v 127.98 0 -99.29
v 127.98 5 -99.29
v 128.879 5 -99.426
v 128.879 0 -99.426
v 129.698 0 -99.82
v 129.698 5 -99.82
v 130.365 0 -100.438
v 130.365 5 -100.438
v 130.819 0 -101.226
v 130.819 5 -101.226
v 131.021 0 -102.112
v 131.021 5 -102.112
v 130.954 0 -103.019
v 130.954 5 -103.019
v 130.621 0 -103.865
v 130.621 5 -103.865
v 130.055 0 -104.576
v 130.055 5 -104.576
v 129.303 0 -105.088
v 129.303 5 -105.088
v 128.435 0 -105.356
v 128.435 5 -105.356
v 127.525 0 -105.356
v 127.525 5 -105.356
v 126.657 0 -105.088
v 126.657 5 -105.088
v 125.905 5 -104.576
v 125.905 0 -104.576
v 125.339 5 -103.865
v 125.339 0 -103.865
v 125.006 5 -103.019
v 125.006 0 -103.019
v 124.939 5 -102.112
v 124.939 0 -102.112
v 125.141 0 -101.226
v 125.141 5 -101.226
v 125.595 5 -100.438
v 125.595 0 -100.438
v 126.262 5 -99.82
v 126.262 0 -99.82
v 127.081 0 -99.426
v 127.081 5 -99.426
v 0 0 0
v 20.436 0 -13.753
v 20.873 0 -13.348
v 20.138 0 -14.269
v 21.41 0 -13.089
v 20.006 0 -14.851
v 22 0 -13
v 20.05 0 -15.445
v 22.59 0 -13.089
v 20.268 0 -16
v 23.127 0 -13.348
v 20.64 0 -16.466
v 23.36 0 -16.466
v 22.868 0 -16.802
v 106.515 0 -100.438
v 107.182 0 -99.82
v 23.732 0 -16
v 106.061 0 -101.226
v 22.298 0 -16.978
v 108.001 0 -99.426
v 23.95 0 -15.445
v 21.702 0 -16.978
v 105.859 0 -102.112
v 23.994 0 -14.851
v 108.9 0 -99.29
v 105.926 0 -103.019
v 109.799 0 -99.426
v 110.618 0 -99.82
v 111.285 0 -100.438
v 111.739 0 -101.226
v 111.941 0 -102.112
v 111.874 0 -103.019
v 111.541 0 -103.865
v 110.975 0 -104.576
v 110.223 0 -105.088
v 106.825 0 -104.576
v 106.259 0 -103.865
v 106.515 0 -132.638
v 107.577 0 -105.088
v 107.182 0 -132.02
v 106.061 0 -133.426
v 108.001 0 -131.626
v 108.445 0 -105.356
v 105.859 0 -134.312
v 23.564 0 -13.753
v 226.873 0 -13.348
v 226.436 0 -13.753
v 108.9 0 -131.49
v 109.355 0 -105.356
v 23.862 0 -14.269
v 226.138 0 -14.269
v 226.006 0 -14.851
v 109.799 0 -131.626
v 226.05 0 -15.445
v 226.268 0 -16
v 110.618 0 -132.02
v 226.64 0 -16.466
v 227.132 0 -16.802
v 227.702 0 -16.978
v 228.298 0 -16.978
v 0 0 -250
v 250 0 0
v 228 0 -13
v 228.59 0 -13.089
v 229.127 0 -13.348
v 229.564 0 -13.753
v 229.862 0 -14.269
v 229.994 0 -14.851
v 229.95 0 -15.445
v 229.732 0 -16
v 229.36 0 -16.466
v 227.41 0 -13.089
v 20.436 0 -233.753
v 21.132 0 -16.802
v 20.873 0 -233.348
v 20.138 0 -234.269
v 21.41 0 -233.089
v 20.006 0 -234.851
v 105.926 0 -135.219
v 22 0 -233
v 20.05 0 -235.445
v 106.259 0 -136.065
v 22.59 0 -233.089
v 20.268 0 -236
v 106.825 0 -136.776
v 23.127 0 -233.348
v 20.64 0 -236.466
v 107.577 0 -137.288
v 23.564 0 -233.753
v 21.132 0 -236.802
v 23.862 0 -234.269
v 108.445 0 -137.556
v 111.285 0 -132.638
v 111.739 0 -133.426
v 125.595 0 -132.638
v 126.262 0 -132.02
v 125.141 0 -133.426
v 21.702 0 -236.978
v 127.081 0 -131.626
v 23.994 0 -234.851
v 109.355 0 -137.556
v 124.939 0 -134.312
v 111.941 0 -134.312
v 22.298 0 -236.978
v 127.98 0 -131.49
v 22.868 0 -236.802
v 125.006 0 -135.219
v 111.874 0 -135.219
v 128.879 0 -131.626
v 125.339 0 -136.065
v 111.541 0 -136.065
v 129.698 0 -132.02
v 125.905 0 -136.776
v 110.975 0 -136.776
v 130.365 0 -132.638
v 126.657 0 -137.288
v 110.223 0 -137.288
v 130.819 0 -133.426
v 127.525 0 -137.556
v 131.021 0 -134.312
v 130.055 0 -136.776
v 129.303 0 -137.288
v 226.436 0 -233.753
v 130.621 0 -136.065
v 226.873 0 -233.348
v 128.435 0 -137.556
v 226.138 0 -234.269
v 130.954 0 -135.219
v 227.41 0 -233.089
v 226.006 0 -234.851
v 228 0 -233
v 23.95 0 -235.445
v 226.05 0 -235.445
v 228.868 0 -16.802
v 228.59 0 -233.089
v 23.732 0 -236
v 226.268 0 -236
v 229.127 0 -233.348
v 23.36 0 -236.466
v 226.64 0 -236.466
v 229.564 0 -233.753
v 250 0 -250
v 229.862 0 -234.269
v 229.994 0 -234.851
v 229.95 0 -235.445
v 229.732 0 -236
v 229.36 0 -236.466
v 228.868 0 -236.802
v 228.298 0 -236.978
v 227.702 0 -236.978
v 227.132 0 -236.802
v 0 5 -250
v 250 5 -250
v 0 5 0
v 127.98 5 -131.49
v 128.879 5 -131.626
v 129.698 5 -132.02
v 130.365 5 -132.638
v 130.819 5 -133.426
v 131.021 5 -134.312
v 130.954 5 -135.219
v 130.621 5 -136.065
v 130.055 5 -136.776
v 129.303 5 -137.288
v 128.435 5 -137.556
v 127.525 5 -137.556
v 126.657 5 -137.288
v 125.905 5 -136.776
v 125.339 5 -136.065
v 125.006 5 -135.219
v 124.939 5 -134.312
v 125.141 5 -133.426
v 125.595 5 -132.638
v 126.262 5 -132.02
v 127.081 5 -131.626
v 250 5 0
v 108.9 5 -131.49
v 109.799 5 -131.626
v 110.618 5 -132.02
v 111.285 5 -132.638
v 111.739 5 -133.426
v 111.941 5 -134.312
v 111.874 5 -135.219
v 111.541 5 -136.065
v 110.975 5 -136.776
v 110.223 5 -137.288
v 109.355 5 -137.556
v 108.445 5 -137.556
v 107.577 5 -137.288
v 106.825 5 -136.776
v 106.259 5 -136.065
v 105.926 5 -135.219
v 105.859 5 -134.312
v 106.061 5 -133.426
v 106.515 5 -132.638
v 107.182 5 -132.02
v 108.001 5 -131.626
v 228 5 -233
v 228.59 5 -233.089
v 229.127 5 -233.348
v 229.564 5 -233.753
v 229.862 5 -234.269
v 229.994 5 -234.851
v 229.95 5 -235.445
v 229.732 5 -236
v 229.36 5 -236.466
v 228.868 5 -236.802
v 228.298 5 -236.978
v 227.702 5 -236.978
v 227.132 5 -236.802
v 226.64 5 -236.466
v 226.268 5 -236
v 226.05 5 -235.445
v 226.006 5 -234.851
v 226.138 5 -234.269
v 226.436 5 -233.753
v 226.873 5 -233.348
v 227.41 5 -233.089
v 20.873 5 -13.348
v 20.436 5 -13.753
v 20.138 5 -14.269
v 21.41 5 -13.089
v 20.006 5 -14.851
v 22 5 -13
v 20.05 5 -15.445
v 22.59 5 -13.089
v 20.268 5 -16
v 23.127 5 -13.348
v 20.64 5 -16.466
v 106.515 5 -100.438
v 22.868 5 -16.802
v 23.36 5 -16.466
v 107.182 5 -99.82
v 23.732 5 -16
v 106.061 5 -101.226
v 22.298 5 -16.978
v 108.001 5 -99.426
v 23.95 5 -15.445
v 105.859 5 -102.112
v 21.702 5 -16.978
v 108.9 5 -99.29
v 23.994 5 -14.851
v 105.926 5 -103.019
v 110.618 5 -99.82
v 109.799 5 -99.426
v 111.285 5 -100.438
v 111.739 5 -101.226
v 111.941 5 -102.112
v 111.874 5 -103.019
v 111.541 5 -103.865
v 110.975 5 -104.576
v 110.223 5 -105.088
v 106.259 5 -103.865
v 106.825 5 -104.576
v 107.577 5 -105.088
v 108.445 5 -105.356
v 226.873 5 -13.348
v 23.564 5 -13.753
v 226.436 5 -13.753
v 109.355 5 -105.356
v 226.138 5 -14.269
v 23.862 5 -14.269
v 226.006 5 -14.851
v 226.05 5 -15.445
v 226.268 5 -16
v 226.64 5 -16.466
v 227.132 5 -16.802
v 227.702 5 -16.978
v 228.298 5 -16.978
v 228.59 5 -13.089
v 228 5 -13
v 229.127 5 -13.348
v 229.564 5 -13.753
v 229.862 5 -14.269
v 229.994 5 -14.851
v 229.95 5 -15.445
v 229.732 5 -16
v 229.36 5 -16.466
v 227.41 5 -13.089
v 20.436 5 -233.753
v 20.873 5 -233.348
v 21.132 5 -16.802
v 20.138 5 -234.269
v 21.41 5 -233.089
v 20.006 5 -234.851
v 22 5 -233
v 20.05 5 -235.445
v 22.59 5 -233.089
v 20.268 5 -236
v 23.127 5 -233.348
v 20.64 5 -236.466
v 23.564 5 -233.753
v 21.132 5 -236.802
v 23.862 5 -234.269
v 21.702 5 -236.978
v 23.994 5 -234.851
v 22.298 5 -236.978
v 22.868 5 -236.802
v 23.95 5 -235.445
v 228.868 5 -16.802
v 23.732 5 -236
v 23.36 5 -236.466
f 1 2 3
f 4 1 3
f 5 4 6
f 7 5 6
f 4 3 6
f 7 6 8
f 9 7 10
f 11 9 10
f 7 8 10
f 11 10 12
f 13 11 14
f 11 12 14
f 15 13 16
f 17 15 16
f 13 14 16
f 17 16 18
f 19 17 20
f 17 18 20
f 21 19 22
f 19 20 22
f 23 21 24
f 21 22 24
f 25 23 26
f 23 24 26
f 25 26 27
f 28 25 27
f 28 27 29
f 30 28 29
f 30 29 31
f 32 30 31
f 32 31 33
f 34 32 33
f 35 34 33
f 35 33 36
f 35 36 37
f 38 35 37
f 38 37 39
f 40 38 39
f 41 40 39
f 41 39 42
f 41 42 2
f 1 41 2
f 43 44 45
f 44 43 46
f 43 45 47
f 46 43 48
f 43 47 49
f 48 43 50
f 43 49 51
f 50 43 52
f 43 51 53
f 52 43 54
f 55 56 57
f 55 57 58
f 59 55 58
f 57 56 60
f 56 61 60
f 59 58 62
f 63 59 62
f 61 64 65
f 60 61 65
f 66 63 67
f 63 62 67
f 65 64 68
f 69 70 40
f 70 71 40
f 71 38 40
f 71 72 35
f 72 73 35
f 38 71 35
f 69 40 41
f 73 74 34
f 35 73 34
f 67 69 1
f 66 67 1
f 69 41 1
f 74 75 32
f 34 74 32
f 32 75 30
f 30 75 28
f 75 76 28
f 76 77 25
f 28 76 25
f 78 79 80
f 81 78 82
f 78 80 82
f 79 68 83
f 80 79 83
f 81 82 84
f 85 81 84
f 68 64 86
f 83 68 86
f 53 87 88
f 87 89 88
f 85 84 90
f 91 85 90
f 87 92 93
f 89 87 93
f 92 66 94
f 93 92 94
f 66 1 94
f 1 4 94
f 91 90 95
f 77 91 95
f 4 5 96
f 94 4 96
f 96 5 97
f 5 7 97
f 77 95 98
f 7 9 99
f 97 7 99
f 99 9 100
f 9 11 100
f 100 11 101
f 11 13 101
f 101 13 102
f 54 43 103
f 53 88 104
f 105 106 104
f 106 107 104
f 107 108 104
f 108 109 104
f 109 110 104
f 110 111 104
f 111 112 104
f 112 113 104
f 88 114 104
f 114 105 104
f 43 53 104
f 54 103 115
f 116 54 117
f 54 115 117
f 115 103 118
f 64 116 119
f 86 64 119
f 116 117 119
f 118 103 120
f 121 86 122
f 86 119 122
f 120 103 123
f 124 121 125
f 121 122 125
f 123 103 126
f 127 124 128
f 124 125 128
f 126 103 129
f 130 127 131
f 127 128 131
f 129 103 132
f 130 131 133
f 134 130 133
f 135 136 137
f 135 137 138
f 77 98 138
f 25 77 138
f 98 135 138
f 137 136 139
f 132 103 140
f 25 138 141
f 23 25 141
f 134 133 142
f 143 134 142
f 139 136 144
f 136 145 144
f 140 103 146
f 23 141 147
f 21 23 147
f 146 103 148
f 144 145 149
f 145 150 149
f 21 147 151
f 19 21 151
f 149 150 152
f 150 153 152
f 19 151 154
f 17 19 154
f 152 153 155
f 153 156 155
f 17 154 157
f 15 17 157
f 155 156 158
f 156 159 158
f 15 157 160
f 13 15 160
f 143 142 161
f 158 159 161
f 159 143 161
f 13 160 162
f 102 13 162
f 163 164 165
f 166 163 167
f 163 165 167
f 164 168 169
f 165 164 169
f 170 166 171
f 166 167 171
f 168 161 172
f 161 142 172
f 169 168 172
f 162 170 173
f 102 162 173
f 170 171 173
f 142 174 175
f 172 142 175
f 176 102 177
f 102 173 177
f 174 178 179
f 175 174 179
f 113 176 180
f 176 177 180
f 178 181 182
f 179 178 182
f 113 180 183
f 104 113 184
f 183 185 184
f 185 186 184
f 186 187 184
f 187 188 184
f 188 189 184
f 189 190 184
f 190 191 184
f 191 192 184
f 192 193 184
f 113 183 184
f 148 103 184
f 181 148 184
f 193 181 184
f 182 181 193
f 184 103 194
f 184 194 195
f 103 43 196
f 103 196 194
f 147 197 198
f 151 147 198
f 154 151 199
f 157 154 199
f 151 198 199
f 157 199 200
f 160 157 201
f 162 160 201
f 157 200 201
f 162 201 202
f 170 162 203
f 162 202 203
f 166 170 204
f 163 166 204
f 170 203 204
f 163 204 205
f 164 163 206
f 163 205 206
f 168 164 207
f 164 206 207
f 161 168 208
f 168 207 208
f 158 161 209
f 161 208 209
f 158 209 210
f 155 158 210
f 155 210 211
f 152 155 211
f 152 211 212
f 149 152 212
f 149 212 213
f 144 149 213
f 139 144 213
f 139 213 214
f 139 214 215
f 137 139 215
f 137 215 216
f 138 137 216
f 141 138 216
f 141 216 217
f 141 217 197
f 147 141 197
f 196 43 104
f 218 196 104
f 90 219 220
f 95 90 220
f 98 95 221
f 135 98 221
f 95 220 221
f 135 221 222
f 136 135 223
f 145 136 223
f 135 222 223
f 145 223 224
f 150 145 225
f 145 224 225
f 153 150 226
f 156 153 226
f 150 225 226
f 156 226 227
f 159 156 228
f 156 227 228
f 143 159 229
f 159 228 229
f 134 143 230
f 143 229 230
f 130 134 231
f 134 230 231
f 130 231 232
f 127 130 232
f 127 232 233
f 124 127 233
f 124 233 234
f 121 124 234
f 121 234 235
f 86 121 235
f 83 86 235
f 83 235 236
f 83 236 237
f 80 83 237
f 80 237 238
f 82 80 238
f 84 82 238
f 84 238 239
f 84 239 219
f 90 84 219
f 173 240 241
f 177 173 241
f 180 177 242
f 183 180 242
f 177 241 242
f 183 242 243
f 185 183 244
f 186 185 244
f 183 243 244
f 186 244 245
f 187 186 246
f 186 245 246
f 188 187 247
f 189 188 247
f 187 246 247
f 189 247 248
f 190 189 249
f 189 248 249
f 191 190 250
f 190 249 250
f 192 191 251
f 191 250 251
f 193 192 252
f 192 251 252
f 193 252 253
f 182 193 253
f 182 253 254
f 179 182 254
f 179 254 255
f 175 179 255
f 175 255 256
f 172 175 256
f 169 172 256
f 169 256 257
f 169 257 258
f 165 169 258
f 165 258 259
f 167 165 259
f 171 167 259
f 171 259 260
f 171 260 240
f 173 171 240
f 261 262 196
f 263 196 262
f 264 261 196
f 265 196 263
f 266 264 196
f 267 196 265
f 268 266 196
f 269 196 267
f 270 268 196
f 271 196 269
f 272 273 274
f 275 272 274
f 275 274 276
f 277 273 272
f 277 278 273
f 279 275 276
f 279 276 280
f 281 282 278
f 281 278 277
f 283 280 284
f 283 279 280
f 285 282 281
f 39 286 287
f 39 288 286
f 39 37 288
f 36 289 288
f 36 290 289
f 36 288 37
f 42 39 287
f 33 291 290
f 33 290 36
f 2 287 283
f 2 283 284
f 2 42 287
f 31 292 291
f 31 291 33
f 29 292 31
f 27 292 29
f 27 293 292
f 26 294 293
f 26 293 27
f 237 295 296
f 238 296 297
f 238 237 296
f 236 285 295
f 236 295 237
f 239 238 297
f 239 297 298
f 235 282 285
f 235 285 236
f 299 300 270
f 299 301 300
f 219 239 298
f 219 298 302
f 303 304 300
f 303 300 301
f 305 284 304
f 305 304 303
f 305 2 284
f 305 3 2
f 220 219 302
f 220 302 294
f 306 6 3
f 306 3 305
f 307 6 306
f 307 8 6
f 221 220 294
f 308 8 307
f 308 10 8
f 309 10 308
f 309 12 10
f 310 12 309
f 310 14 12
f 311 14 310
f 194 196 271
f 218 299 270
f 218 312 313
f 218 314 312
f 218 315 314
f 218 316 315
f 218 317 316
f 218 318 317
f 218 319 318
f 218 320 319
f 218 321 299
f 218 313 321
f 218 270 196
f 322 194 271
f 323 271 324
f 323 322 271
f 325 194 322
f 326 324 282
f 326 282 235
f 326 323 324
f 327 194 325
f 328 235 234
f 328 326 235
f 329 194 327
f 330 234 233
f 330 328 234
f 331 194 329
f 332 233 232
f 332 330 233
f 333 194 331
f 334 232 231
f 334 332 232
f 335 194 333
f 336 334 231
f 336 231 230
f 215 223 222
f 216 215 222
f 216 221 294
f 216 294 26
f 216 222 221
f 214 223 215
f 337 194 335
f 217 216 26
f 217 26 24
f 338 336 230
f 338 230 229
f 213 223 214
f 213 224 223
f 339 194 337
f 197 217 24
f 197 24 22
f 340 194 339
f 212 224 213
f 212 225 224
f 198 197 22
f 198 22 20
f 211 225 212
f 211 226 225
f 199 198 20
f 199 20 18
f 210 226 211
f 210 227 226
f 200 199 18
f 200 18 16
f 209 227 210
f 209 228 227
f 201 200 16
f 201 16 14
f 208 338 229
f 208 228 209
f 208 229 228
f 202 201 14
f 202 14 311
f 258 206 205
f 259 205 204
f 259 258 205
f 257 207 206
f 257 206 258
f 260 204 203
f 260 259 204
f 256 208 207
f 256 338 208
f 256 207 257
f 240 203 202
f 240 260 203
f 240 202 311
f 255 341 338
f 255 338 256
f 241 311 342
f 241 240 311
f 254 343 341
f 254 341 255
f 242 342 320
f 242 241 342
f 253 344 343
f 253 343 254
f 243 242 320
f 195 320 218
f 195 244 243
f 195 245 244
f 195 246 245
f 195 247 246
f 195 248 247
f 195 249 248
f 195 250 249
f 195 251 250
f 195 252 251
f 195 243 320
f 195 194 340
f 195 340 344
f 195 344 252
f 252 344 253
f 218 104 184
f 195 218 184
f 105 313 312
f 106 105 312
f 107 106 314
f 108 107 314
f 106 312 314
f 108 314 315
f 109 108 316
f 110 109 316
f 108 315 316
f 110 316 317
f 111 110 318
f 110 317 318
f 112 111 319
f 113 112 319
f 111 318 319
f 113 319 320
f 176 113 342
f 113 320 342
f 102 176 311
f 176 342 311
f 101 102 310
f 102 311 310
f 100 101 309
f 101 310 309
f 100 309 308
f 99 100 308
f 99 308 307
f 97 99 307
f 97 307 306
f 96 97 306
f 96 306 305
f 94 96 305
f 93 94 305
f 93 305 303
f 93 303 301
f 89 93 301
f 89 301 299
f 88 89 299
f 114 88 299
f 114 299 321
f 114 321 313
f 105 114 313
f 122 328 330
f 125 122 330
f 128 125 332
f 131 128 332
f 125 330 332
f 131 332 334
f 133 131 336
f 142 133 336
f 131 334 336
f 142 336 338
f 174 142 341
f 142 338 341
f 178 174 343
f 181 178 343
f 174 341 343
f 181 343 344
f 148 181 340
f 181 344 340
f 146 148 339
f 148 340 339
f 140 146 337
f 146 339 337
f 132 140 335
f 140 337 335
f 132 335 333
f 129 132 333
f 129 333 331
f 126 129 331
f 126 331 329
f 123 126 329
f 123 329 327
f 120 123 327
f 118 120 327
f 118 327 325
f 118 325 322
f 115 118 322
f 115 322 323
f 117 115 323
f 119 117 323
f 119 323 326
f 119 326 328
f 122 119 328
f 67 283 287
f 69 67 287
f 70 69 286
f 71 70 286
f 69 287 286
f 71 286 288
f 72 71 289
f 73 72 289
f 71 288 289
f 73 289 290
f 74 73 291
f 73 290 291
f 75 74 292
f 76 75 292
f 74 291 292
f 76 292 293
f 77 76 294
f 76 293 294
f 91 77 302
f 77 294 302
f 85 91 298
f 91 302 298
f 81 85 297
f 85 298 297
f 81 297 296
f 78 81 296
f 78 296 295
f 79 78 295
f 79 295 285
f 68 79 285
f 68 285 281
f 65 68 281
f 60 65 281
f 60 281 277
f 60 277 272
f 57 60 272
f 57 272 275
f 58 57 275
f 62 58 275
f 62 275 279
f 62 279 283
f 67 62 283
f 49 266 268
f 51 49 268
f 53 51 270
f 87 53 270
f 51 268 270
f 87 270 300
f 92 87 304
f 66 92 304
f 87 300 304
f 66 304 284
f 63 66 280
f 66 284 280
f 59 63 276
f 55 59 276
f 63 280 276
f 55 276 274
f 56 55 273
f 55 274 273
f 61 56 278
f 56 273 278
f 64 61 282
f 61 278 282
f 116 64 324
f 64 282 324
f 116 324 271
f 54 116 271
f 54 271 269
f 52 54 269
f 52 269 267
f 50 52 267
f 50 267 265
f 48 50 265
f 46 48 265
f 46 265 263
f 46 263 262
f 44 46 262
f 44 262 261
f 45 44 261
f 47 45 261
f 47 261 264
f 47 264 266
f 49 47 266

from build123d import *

# Parameters (mm, degrees)
SKETCH2_W            = 250
SKETCH2_H            = 250
BOSS_EXTRUDE1_DEPTH  = 5
SKETCH3_R            = 2
SKETCH3_R_2          = 3.05
CUT_EXTRUDE1_DEPTH   = 354.588744165
LPATTERN1_COUNT      = 2
LPATTERN1_PITCH      = 220
LPATTERN1_COUNT_DIR2 = 2
LPATTERN1_PITCH_DIR2 = 206


with BuildPart() as part:
    # Sketch2 → Boss-Extrude1 (new body)
    with BuildSketch(Plane(origin=(0, 0, 0), x_dir=(1, 0, 0), z_dir=(0, 1, 0))):
        with Locations((125, 125)):
            Rectangle(SKETCH2_W, SKETCH2_H)
    extrude(amount=BOSS_EXTRUDE1_DEPTH)

    # Sketch3 → Cut-Extrude1 (cut, through all)
    with BuildSketch(Plane(origin=(0, 5, 0), x_dir=(1, 0, 0), z_dir=(0, 1, 0))):
        with Locations(Location((22, 15, 0), (0, 0, 270))):
            Circle(SKETCH3_R)
        with Locations(Location((108.9, 134.54, 0), (0, 0, 270))):
            Circle(SKETCH3_R_2)
        with Locations(Location((127.98, 134.54, 0), (0, 0, 270))):
            Circle(SKETCH3_R_2)
        with Locations(Location((127.98, 102.34, 0), (0, 0, 270))):
            Circle(SKETCH3_R_2)
        with Locations(Location((108.9, 102.34, 0), (0, 0, 270))):
            Circle(SKETCH3_R_2)
    cut_extrude1 = extrude(amount=-CUT_EXTRUDE1_DEPTH, mode=Mode.SUBTRACT)

    # LPattern1: Cut-Extrude1 2 × 2
    with Locations(*[(j * LPATTERN1_PITCH_DIR2, 0, -i * LPATTERN1_PITCH) for i in range(LPATTERN1_COUNT) for j in range(LPATTERN1_COUNT_DIR2) if (i, j) != (0, 0)]):
        add(cut_extrude1, mode=Mode.SUBTRACT)


solid = part.part
